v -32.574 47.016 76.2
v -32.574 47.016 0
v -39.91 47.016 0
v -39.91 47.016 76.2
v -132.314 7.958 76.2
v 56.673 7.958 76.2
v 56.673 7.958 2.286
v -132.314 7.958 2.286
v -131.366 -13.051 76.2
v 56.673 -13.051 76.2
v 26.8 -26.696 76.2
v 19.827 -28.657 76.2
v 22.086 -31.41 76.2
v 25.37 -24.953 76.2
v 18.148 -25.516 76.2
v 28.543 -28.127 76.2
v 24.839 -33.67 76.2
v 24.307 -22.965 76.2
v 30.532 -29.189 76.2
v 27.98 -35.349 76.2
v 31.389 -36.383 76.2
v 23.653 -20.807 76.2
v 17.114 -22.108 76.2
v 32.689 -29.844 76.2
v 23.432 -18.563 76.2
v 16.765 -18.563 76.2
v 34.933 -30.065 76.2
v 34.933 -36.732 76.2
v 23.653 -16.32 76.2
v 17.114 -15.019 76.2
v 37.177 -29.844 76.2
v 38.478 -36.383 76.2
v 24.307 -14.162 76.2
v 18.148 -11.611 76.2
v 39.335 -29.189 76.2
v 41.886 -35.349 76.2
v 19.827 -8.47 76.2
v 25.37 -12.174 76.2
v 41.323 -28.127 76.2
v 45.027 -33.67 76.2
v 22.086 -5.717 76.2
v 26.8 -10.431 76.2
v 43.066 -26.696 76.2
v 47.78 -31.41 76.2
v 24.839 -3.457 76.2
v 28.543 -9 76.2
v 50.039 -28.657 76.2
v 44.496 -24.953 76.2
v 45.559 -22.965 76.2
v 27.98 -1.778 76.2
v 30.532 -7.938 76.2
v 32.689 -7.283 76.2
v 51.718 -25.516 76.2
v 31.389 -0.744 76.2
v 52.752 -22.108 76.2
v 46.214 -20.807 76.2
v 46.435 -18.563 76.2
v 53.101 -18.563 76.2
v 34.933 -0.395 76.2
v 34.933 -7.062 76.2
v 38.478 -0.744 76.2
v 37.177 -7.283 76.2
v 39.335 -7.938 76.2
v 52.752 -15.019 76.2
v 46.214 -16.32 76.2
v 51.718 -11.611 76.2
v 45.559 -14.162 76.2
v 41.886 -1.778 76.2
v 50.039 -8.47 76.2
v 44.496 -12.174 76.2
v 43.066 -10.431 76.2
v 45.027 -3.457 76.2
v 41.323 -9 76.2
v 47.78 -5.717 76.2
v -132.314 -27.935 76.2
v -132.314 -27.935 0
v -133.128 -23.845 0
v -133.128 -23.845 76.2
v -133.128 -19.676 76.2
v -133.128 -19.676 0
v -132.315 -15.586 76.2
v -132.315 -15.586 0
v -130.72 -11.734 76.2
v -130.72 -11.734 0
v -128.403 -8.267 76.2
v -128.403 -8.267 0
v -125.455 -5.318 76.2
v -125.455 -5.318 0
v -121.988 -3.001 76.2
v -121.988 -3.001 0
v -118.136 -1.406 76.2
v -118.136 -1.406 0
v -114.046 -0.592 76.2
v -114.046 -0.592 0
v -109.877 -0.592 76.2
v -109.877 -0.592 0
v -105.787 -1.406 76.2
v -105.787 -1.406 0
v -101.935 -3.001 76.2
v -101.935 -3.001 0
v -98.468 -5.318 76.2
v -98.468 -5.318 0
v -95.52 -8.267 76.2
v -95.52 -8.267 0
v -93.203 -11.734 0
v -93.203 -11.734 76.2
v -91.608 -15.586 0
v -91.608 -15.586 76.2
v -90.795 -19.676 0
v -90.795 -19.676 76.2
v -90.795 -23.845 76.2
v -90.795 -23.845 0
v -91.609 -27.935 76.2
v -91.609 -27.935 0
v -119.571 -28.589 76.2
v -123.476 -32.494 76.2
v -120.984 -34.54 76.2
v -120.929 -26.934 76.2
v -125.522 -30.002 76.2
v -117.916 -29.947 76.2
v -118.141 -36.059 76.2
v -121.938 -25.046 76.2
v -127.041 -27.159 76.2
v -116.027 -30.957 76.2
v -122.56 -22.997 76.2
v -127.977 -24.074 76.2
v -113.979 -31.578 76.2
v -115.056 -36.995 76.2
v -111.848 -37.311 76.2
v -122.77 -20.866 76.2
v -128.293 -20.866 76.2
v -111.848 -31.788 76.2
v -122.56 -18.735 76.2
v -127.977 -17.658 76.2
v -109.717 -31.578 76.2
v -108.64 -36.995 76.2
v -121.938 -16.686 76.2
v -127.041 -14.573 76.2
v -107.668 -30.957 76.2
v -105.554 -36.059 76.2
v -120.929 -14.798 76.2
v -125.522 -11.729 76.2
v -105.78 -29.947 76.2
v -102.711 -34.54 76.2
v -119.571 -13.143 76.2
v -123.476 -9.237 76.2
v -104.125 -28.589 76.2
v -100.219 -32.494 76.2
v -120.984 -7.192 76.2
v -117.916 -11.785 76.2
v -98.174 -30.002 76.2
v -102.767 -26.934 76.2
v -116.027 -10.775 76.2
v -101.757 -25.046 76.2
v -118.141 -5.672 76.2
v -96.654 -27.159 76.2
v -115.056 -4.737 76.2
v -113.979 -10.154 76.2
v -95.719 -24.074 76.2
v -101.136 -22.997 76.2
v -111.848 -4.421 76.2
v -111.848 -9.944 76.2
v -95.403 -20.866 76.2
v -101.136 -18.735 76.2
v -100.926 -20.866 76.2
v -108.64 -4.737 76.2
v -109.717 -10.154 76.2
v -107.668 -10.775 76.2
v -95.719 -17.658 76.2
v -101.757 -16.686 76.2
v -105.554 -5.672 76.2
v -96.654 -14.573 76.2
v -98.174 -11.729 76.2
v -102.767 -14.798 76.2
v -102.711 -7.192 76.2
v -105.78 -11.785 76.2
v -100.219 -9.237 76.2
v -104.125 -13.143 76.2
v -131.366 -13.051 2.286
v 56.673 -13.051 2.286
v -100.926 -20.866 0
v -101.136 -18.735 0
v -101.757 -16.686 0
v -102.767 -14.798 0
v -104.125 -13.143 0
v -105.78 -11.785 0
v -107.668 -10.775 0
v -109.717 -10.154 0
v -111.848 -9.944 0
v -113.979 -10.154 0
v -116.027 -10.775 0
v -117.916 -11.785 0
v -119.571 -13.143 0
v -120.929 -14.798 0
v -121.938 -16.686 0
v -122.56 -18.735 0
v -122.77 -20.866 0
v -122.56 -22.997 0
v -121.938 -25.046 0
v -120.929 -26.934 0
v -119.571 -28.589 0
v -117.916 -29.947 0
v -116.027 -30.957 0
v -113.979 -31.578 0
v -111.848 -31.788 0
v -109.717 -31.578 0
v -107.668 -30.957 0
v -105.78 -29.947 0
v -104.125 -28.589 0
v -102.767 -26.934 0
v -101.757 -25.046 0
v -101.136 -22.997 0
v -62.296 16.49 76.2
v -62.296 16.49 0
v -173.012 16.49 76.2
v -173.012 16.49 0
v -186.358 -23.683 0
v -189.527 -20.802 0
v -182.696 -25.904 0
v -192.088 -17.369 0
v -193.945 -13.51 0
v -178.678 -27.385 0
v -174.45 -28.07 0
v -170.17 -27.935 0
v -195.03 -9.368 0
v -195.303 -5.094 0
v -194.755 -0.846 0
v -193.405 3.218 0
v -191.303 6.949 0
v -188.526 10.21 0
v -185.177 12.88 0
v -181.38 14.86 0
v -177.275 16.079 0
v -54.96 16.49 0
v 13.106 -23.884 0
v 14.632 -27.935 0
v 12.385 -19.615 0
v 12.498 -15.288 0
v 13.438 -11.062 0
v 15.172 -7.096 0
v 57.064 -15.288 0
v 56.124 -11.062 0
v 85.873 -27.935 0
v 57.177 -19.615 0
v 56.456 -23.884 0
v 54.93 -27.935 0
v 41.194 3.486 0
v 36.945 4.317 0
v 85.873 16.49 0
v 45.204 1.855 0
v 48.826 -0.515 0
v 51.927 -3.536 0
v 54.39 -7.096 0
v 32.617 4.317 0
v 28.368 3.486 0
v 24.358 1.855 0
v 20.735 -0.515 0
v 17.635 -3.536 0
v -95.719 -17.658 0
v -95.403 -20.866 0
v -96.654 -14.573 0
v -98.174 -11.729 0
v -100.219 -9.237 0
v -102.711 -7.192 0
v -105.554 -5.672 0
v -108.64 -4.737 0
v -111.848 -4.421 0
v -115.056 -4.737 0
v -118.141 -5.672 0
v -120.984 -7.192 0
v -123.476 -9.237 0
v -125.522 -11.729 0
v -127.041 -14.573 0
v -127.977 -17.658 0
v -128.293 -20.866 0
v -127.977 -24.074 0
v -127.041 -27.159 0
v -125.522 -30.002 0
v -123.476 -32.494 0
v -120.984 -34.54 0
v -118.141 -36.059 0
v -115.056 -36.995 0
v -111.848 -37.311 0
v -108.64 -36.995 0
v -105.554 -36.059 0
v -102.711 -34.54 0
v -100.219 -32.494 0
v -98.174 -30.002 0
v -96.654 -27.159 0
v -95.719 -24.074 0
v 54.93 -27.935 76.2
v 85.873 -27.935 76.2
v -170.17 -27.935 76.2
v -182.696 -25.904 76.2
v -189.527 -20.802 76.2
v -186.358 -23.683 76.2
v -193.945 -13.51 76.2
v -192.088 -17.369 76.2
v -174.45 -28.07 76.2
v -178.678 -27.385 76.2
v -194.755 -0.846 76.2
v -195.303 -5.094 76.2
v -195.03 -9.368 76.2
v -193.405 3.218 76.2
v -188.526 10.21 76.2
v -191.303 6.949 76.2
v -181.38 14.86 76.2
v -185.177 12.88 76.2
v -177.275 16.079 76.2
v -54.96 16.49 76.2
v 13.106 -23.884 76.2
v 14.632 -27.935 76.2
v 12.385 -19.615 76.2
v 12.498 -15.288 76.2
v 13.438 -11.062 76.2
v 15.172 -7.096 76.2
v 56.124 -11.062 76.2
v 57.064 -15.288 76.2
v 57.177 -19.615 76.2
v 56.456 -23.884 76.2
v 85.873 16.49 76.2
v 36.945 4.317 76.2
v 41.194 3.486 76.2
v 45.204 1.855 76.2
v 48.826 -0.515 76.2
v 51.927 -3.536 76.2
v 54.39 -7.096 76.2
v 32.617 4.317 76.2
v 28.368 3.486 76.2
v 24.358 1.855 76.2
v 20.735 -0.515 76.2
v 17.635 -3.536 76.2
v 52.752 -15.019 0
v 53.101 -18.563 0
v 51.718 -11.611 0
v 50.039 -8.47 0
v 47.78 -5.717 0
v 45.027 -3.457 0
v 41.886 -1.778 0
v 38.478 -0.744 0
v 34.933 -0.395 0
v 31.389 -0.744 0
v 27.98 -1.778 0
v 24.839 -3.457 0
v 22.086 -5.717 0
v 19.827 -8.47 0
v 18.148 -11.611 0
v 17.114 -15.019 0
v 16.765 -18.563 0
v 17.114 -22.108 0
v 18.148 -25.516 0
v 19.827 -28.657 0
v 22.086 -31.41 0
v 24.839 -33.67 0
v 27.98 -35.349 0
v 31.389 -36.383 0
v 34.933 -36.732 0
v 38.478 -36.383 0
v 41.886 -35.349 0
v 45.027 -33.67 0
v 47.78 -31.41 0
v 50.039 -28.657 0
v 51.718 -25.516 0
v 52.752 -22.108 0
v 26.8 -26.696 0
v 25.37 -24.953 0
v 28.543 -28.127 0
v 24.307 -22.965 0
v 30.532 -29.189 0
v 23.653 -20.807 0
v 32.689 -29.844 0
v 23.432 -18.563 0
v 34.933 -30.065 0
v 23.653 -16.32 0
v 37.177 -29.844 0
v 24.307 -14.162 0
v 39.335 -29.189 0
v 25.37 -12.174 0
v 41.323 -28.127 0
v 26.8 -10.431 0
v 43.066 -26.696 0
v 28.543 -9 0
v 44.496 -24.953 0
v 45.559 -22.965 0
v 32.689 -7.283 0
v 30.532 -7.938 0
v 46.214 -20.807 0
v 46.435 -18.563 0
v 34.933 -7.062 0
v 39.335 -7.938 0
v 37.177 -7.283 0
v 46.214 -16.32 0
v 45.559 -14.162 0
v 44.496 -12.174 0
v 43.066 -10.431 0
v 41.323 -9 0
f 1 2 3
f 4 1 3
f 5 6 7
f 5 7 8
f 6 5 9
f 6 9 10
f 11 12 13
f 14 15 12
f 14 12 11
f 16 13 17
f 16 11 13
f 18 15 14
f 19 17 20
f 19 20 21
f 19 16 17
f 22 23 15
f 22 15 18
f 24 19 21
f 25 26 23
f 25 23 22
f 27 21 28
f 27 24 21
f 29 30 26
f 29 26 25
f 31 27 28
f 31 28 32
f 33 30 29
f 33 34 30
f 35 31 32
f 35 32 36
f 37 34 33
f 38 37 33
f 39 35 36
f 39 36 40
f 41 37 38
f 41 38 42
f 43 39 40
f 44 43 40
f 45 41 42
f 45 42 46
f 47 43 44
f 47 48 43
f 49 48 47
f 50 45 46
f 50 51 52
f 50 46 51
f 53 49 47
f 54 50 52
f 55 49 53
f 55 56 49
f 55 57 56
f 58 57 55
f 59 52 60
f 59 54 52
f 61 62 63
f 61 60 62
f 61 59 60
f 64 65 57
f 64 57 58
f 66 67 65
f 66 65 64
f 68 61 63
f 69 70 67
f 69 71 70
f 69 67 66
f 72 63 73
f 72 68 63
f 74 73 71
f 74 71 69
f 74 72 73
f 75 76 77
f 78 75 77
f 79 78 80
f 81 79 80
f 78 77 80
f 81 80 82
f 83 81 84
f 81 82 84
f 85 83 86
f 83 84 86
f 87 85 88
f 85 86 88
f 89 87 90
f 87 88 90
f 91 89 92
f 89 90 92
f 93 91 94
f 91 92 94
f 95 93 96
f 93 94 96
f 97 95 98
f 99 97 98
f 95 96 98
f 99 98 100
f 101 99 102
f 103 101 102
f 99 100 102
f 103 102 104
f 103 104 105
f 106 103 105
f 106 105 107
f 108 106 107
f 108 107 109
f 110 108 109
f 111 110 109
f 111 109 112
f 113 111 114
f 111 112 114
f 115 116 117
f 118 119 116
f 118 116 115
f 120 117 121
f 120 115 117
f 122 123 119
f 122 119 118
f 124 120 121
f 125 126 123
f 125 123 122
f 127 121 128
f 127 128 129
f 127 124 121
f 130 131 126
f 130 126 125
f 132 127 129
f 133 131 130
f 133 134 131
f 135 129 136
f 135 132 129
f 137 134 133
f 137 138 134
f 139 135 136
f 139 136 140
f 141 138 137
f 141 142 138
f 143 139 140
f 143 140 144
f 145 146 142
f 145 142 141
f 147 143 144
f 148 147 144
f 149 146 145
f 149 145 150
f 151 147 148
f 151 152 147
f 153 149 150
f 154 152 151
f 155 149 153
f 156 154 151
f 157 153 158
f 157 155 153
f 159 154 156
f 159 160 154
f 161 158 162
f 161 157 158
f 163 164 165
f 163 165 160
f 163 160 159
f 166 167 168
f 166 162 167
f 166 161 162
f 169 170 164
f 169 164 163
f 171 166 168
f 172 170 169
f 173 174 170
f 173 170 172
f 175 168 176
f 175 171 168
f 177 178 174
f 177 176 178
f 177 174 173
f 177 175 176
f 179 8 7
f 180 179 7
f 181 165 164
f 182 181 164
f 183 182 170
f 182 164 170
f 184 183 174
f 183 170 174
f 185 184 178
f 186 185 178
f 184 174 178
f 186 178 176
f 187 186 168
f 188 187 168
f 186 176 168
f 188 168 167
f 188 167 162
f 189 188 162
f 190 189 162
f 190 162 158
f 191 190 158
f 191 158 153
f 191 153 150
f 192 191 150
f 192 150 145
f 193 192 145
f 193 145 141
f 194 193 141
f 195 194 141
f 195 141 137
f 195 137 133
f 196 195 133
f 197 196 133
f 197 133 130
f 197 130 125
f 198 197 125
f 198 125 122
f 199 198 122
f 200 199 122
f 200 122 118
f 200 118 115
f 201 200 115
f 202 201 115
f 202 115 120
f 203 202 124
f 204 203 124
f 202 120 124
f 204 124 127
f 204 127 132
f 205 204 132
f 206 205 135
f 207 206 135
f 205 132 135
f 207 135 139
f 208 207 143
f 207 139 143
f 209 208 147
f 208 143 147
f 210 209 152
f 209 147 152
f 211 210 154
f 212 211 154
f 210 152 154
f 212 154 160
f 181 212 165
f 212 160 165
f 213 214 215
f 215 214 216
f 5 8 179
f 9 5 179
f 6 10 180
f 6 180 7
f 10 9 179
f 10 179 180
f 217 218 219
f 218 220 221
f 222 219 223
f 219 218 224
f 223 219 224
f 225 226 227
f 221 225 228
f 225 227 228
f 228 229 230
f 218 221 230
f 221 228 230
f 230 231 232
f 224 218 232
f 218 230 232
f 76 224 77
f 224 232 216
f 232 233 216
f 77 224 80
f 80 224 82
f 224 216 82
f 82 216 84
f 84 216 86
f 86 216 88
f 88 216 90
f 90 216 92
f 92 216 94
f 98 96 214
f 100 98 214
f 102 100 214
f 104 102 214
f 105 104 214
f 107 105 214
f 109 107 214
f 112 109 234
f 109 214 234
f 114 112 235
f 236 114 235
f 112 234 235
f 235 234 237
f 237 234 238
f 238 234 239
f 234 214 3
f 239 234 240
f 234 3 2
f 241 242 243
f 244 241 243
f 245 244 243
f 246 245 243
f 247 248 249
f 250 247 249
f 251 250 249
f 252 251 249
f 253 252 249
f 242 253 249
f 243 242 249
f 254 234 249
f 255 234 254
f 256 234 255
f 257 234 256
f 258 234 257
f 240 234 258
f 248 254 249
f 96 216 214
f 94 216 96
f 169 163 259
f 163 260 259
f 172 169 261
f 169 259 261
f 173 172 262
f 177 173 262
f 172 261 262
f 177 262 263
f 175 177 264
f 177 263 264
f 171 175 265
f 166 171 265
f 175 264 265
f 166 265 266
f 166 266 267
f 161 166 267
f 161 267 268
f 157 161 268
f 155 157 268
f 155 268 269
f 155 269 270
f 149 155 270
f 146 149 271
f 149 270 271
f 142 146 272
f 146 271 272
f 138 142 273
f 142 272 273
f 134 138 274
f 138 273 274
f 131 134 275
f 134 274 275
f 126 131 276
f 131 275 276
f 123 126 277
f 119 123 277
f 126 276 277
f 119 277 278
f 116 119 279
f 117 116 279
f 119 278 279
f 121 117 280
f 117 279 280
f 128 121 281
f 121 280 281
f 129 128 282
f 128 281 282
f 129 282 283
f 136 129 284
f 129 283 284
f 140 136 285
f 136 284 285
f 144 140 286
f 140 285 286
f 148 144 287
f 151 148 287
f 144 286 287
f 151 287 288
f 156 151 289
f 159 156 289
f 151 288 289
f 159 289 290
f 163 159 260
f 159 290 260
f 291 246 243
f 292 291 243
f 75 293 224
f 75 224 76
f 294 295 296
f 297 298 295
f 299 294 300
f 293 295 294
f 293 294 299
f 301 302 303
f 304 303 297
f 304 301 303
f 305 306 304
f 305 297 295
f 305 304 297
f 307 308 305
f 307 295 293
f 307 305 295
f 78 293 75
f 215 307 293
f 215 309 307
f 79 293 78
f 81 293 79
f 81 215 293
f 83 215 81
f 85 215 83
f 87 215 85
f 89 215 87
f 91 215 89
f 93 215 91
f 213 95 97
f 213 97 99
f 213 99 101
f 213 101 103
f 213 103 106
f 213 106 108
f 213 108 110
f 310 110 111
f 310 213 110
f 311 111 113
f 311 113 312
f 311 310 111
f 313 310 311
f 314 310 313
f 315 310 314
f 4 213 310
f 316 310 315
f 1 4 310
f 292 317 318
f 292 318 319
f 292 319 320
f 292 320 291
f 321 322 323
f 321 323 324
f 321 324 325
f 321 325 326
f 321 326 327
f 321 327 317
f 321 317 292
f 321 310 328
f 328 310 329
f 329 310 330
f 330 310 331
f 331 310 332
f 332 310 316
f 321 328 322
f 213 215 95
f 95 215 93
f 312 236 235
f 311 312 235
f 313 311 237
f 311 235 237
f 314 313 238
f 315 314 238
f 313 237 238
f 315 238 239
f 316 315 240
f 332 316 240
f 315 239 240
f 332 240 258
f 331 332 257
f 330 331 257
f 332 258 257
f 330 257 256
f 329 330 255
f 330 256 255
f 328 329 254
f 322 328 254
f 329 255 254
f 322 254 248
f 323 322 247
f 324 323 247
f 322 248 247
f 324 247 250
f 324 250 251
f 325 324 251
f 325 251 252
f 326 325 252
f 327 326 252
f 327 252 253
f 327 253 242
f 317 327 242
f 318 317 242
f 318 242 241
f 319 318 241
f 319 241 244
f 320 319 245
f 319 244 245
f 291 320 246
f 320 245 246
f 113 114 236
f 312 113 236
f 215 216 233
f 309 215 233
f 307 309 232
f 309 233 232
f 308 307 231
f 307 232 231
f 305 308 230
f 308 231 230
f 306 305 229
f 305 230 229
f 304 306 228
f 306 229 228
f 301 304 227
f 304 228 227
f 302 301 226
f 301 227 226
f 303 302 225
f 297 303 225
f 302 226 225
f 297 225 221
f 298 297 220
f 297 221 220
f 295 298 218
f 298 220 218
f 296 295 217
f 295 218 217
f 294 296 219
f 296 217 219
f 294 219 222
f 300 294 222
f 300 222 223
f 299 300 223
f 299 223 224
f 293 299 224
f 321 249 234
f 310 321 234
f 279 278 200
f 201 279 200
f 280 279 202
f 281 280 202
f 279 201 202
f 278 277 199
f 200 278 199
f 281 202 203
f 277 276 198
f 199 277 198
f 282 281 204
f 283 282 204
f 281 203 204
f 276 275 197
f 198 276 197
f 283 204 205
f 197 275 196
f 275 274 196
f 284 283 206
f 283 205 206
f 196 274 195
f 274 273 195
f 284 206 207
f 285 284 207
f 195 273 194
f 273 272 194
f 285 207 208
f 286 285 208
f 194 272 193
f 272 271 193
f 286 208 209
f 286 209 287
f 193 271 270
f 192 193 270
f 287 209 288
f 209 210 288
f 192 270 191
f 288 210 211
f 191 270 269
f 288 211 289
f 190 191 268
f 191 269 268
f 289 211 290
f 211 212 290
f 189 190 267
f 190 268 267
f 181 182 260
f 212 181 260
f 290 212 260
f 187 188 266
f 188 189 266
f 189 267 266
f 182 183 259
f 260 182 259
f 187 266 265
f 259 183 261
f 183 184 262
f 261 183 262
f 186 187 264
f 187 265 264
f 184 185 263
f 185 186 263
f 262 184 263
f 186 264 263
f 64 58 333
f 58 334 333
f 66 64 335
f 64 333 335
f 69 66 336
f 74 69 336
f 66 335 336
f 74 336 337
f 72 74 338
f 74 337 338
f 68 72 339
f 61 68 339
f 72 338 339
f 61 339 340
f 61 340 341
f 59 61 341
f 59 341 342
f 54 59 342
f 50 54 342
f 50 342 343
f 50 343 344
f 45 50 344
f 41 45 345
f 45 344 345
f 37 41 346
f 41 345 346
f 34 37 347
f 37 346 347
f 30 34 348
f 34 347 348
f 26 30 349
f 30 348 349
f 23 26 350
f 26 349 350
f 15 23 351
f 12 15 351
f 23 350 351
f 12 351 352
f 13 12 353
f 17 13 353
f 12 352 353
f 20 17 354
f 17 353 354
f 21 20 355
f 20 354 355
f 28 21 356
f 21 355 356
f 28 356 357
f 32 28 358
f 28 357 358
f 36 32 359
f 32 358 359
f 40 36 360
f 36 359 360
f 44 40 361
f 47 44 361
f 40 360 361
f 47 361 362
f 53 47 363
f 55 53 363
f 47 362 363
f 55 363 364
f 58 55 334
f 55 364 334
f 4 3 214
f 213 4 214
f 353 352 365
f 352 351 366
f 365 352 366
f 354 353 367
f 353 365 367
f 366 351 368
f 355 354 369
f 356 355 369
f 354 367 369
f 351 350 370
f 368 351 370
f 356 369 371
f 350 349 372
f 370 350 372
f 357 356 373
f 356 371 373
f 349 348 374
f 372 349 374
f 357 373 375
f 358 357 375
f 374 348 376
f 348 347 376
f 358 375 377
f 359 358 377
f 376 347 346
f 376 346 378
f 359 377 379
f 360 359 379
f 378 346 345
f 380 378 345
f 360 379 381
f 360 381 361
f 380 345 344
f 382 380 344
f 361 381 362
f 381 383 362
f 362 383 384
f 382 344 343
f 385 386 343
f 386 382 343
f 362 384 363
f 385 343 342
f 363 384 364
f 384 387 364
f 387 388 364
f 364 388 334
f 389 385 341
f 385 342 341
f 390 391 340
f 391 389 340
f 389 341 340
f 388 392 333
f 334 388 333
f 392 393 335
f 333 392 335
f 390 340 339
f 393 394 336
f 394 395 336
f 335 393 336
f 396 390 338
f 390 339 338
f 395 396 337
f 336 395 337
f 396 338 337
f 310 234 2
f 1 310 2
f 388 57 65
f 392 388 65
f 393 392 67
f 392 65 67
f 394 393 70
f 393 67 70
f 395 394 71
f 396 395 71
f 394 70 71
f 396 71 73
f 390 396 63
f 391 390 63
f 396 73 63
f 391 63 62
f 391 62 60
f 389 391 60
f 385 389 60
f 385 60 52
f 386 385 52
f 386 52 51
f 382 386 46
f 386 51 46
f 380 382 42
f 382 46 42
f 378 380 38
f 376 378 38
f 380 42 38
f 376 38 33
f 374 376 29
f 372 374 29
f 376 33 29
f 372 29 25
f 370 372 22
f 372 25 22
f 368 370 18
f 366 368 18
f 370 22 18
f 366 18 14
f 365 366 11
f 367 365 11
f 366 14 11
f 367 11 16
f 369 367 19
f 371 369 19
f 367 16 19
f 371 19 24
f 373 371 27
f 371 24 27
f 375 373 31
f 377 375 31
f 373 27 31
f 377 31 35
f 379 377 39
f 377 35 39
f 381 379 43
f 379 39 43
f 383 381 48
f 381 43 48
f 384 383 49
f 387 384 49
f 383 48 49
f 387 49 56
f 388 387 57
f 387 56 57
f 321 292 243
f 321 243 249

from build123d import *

# Parameters (mm, degrees)
F1_DEPTH  = 76.2
F2_R      = 16.4452720744
F3_DEPTH  = 25.4
F4_R      = 18.1682730775
F5_DEPTH  = 25.4
F6_DEPTH  = 25.4
F7_DEPTH  = 25.4
F8_DEPTH  = 25.4
F9_DEPTH  = 25.4
F10_R     = 10.922
F11_DEPTH = 134.112
F12_R     = 11.5014392976
F13_DEPTH = 76.2
F15_DEPTH = 73.914


with BuildPart() as f1:
    # F0 (on Top) → F1 (new body)
    with BuildSketch(Plane.XY):
        with BuildLine():
            Line((-62.2958354652, 16.4899136871), (-131.8960487843, 16.4899136871))
            Line((-131.8960487843, 16.4899136871), (-173.0117797852, 16.4899136871))
            ThreePointArc((-173.0117797852, 16.4899136871), (-195.2694742961, -7.2371742186), (-170.1698005199, -27.9346629977))
            Line((-170.1698005199, -27.9346629977), (-132.3144286871, -27.9346629977))
            ThreePointArc((-132.3144286871, -27.9346629977), (-111.9615621865, -0.4898018185), (-91.6086956859, -27.9346629977))
            Line((-91.6086956859, -27.9346629977), (14.6319679916, -27.9346629977))
            ThreePointArc((14.6319679916, -27.9346629977), (34.7809791565, 4.4211238029), (54.9299903214, -27.9346629977))
            Line((54.9299903214, -27.9346629977), (85.8727321029, -27.9346629977))
            Line((85.8727321029, -27.9346629977), (85.8727321029, 16.4899136871))
            Line((85.8727321029, 16.4899136871), (-54.96006459, 16.4899136871))
            Line((-54.96006459, 16.4899136871), (-62.2958354652, 16.4899136871))
        make_face()
        Polygon((-39.9097986519, 47.0163226128), (-62.2958354652, 16.4899136871), (-54.96006459, 16.4899136871), (-32.5740277767, 47.0163226128), align=None)
    extrude(amount=F1_DEPTH)


with BuildPart() as f3:
    # F2 (on Top) → F3 (new body)
    with BuildSketch(Plane.XY):
        with Locations((-111.8478253484, -20.8659172058)):
            Circle(F2_R)
    extrude(amount=F3_DEPTH)

    # F6 (add): a face of the model
    f6_faces = [f3.faces().sort_by_distance(p)[0] for p in [
        (-111.8478253484, -20.8659172058, 25.4),
    ]]
    extrude(f6_faces, amount=F6_DEPTH)

    # F7 (add): a face of the model
    f7_faces = [f3.faces().sort_by_distance(p)[0] for p in [
        (-111.8478253484, -20.8659172058, 50.8),
    ]]
    extrude(f7_faces, amount=F7_DEPTH)

    # F10 (on face) → F11 (cut)
    with BuildSketch(Plane.XY.offset(76.2)):
        with Locations((-111.8478253484, -20.8659172058)):
            Circle(F10_R)
    extrude(amount=-F11_DEPTH, mode=Mode.SUBTRACT)


with BuildPart() as f5:
    # F4 (on Top) → F5 (new body)
    with BuildSketch(Plane.XY):
        with Locations((34.9331013858, -18.5634717345)):
            Circle(F4_R)
    extrude(amount=F5_DEPTH)

    # F8 (add): a face of the model
    f8_faces = [f5.faces().sort_by_distance(p)[0] for p in [
        (34.9331013858, -18.5634717345, 25.4),
    ]]
    extrude(f8_faces, amount=F8_DEPTH)

    # F9 (add): a face of the model
    f9_faces = [f5.faces().sort_by_distance(p)[0] for p in [
        (34.9331013858, -18.5634717345, 50.8),
    ]]
    extrude(f9_faces, amount=F9_DEPTH)

    # F12 (on face) → F13 (cut)
    with BuildSketch(Plane.XY.offset(76.2)):
        with Locations((34.9331013858, -18.5634717345)):
            Circle(F12_R)
    extrude(amount=-F13_DEPTH, mode=Mode.SUBTRACT)


with BuildPart() as f15:
    # F14 (on face) → F15 (new body)
    with BuildSketch(Plane.XY.offset(76.2)):
        Polygon((-132.3144286871, 7.9584084451), (-131.3663326487, -13.0507678567), (56.6733867137, -13.0507678567), (56.6733867137, 7.9584084451), align=None)
    extrude(amount=-F15_DEPTH)


solid = Compound([f1.part, f3.part, f5.part, f15.part])
